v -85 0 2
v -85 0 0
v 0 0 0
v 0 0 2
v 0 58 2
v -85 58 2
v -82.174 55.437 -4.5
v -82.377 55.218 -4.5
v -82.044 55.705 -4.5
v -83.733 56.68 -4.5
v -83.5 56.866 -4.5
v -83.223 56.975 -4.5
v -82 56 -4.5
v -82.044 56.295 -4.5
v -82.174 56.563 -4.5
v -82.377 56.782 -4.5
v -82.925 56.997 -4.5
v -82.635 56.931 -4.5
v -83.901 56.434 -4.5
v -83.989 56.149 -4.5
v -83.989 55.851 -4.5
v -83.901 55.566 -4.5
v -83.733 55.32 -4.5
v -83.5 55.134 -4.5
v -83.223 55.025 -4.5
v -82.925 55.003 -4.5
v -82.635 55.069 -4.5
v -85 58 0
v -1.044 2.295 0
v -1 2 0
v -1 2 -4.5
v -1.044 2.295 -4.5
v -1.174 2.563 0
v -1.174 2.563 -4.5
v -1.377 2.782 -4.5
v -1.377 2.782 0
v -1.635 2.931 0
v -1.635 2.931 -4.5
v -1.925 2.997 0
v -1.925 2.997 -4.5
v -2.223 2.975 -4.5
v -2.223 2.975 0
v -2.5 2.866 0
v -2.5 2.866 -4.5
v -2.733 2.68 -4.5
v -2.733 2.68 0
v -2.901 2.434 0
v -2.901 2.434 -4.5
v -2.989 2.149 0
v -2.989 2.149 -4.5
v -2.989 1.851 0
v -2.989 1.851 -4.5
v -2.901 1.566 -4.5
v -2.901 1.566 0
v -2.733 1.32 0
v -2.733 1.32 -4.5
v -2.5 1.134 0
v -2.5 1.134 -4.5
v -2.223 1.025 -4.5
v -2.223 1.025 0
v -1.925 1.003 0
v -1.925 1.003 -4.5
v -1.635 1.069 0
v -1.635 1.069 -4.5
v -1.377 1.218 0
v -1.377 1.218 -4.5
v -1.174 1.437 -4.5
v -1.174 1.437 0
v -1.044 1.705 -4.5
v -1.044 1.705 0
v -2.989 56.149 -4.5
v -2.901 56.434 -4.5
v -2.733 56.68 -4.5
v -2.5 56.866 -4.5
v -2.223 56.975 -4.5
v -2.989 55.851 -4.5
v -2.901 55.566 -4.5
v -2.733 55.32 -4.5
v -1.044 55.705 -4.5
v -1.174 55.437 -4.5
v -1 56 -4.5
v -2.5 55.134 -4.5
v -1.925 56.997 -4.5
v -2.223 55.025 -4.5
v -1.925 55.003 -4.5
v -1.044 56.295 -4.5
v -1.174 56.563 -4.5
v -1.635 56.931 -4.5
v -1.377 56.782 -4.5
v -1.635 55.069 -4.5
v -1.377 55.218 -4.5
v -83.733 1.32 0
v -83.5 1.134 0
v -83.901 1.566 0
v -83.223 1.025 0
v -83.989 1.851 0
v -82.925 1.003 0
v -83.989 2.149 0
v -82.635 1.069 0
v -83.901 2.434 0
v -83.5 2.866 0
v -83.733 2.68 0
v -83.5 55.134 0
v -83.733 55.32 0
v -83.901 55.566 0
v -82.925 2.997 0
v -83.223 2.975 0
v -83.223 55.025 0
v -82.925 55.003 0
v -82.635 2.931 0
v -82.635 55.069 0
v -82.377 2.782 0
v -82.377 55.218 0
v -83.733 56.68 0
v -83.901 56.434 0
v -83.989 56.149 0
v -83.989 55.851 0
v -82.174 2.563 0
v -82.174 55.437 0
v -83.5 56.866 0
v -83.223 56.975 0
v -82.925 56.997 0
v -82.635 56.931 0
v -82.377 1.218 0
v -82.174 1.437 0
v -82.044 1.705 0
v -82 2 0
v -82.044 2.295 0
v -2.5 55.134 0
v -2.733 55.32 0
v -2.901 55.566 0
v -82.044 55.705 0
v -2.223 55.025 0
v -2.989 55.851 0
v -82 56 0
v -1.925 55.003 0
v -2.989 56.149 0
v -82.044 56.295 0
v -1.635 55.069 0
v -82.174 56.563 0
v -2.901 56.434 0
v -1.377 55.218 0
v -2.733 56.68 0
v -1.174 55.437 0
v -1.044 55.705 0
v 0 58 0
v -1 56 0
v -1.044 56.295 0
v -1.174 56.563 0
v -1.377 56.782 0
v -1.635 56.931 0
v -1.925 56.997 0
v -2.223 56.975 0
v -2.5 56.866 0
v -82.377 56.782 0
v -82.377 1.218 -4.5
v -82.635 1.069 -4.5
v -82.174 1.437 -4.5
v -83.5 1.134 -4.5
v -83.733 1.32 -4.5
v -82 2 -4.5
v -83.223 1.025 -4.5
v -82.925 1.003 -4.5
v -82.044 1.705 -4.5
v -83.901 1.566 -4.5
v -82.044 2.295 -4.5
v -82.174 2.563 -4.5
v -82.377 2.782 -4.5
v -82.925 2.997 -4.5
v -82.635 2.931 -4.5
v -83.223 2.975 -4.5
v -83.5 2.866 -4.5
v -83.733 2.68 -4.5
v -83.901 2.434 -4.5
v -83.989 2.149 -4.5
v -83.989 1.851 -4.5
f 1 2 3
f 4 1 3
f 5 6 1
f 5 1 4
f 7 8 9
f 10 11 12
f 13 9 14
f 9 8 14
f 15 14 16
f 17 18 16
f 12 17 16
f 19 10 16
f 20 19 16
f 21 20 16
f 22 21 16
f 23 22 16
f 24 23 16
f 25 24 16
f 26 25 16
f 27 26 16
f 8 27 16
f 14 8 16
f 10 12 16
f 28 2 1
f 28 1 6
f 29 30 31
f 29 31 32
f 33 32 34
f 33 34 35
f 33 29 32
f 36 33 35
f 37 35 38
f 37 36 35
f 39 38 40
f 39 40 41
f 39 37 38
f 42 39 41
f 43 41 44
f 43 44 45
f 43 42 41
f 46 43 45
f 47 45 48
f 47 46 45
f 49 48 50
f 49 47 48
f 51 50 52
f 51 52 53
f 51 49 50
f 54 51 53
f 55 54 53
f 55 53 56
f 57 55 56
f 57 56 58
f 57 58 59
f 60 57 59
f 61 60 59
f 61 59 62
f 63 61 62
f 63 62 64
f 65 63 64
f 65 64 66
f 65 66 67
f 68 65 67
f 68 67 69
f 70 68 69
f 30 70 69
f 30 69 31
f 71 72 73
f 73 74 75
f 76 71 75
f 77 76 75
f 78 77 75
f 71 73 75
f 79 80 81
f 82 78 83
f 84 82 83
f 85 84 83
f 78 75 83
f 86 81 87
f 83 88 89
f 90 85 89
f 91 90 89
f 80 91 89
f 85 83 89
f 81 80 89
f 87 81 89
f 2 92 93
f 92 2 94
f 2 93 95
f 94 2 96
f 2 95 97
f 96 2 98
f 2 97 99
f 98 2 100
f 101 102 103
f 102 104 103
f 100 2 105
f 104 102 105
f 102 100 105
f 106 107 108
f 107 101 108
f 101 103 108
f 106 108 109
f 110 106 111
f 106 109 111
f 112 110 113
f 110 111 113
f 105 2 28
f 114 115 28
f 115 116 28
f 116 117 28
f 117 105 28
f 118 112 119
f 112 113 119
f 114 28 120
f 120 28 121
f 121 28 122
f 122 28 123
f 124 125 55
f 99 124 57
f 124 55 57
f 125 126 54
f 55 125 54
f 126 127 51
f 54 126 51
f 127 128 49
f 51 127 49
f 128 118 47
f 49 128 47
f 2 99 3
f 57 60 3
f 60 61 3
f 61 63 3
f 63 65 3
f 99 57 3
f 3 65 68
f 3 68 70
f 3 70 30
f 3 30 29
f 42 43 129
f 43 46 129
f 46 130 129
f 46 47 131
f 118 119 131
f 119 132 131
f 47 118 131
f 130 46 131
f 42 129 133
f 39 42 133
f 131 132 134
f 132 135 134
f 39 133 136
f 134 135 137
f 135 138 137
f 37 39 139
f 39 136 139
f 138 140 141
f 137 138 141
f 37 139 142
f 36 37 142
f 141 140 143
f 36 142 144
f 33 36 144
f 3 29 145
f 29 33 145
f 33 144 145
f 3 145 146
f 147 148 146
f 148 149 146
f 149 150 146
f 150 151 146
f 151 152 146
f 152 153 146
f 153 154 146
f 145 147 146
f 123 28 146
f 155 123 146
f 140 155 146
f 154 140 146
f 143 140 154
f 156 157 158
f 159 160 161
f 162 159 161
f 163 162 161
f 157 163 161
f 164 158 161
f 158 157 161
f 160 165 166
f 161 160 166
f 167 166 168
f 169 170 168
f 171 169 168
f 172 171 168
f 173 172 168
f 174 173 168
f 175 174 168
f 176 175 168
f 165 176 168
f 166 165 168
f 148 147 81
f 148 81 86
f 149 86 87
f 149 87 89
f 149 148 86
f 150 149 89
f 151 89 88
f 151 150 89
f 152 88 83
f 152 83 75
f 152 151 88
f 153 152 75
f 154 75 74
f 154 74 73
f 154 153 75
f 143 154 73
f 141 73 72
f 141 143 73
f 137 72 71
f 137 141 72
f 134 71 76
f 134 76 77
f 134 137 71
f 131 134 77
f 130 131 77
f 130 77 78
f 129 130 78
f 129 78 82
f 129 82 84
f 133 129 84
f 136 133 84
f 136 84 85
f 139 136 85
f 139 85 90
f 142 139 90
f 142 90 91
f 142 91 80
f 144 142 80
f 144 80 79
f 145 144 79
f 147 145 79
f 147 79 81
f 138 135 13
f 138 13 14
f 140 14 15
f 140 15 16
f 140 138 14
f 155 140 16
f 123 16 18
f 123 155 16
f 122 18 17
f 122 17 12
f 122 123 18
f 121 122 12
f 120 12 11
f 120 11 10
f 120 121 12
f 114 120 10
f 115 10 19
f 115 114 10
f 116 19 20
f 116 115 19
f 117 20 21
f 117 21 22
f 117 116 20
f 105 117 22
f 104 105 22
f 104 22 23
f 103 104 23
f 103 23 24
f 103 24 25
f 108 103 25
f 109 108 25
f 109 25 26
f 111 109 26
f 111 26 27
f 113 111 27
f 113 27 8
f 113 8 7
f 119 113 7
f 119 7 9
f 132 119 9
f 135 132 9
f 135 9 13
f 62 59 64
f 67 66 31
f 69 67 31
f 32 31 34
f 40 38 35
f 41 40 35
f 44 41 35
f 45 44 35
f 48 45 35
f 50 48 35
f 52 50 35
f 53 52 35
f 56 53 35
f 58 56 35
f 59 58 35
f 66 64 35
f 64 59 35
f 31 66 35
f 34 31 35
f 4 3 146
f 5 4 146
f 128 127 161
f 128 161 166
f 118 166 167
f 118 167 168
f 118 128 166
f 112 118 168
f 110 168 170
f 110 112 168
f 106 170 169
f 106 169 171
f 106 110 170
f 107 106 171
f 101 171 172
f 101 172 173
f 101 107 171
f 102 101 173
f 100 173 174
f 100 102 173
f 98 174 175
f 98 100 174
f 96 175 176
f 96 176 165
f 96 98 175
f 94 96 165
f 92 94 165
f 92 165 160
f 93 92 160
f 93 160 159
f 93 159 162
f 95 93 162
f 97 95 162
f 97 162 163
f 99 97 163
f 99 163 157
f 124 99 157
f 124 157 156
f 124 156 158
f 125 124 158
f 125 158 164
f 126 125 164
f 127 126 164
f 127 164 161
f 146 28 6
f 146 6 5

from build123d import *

# Parameters (mm, degrees)
SKETCH1_W           = 85
SKETCH1_H           = 58
BOSS_EXTRUDE1_DEPTH = 2
SKETCH2_R           = 1
BOSS_EXTRUDE3_DEPTH = 6.5


with BuildPart() as part:
    # Sketch1 → Boss-Extrude1 (new body)
    with BuildSketch(Plane.XY):
        with Locations((-42.5, 29)):
            Rectangle(SKETCH1_W, SKETCH1_H)
    extrude(amount=BOSS_EXTRUDE1_DEPTH)

    # Sketch2 → Boss-Extrude3 (add)
    with BuildSketch(Plane.XY.offset(2)):
        with Locations((-83, 56)):
            Circle(SKETCH2_R)
        with Locations((-2, 56)):
            Circle(SKETCH2_R)
        with Locations((-83, 2)):
            Circle(SKETCH2_R)
        with Locations((-2, 2)):
            Circle(SKETCH2_R)
    extrude(amount=-BOSS_EXTRUDE3_DEPTH)


solid = part.part
